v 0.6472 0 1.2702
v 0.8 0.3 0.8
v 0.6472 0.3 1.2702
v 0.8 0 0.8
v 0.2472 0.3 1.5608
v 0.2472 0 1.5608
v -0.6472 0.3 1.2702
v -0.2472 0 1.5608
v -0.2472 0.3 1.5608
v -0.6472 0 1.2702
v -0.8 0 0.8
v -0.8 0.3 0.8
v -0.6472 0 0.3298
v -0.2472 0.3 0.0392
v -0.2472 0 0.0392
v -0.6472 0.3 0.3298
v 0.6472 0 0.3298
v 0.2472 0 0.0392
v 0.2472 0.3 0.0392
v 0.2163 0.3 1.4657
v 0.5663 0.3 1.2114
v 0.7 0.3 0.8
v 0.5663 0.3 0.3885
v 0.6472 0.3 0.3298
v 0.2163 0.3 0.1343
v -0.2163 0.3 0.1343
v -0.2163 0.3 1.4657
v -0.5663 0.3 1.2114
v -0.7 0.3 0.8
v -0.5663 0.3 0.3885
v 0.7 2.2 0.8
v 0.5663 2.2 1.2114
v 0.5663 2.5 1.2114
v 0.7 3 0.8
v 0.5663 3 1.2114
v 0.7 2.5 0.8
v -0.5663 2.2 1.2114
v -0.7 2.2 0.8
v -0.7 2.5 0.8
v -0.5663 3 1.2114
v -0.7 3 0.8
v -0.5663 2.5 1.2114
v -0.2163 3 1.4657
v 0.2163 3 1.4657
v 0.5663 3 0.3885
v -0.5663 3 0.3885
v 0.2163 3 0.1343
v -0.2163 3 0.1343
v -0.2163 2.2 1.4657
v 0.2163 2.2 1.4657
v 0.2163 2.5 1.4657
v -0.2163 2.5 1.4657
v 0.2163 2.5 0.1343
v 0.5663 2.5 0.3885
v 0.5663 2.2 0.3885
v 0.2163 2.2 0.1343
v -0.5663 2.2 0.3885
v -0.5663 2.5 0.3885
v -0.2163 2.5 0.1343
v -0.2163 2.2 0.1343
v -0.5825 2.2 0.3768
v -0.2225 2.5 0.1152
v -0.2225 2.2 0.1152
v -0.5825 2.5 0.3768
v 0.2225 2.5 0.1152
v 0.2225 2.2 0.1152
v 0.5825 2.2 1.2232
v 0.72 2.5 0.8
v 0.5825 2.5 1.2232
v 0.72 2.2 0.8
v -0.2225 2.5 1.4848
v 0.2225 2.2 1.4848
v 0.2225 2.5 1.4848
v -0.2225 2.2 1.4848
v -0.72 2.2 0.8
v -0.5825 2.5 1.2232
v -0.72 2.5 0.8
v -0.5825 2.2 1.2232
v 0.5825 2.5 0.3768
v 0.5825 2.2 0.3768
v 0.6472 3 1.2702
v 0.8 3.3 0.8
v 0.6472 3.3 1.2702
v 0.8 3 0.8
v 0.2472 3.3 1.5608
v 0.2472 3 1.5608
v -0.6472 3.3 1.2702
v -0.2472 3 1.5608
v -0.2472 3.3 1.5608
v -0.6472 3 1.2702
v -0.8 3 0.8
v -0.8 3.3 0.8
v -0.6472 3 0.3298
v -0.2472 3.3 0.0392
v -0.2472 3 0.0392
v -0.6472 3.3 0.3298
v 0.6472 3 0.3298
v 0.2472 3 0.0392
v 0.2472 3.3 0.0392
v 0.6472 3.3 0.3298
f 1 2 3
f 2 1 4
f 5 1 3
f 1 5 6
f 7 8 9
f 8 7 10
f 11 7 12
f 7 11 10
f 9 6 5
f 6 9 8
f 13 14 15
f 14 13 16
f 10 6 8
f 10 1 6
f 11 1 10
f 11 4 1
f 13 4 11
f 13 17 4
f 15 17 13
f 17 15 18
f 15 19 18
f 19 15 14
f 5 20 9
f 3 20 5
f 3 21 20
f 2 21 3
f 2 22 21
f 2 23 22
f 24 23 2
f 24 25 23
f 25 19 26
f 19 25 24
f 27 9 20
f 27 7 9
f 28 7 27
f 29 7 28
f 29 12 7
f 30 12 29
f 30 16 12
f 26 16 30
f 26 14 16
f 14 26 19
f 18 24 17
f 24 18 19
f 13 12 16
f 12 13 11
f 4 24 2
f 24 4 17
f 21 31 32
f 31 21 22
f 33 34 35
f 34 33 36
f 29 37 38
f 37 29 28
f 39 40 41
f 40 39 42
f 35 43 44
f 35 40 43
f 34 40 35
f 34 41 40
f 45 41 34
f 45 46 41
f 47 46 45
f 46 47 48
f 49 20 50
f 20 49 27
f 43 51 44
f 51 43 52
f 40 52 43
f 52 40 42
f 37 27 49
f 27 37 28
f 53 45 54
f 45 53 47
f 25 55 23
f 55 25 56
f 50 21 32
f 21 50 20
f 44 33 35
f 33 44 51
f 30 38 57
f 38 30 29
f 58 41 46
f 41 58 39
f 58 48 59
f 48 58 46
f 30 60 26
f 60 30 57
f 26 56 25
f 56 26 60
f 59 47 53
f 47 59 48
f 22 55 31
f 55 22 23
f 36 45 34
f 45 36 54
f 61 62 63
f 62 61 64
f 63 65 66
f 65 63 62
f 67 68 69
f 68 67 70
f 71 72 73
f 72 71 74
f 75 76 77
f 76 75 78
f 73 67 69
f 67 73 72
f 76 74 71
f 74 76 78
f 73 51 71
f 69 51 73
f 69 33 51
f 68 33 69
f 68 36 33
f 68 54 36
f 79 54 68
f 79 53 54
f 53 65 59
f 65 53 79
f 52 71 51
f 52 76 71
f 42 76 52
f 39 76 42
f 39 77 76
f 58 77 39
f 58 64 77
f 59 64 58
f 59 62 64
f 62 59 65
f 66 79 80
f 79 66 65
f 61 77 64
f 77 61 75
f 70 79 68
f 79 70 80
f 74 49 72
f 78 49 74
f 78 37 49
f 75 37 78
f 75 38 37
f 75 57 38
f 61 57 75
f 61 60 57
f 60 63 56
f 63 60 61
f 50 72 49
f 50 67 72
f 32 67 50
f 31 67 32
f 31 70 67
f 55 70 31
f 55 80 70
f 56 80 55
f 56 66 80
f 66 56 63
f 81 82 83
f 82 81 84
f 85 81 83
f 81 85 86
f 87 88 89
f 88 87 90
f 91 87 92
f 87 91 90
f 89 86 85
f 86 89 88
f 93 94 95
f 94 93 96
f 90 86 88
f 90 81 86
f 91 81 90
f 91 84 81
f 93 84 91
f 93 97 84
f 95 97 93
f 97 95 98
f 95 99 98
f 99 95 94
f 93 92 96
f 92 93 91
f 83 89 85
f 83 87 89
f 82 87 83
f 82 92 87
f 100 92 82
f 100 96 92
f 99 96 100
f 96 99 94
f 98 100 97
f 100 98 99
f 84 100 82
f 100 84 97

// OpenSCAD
ext_r=0.8;
pin_w=0.3;
case_w=3.3;
case_r=0.7;
label_w=0.3;
label_off=0.5;
label_dr=0.02;

$fn=10;

module pin()
{
	translate([0, 0, ext_r])
	mirror([0, 1, 0])
	rotate([90, 0, 0])
	cylinder(h=pin_w, r = ext_r, center= false);	
}

module case()
{
	translate([0, pin_w, ext_r])
	mirror([0, 1, 0])
	rotate([90, 0, 0])
	cylinder(h=case_w-2*pin_w, r = case_r, center= false);	
}

module label()
{
	translate([0, case_w-pin_w-label_w-label_off, ext_r])
	mirror([0, 1, 0])
	rotate([90, 0, 0])
	cylinder(h=label_w, r = case_r+label_dr, center= false);	
}

union() {
	pin();
	case();
	label();
	translate([0,case_w-pin_w,0])
	pin();	
}
